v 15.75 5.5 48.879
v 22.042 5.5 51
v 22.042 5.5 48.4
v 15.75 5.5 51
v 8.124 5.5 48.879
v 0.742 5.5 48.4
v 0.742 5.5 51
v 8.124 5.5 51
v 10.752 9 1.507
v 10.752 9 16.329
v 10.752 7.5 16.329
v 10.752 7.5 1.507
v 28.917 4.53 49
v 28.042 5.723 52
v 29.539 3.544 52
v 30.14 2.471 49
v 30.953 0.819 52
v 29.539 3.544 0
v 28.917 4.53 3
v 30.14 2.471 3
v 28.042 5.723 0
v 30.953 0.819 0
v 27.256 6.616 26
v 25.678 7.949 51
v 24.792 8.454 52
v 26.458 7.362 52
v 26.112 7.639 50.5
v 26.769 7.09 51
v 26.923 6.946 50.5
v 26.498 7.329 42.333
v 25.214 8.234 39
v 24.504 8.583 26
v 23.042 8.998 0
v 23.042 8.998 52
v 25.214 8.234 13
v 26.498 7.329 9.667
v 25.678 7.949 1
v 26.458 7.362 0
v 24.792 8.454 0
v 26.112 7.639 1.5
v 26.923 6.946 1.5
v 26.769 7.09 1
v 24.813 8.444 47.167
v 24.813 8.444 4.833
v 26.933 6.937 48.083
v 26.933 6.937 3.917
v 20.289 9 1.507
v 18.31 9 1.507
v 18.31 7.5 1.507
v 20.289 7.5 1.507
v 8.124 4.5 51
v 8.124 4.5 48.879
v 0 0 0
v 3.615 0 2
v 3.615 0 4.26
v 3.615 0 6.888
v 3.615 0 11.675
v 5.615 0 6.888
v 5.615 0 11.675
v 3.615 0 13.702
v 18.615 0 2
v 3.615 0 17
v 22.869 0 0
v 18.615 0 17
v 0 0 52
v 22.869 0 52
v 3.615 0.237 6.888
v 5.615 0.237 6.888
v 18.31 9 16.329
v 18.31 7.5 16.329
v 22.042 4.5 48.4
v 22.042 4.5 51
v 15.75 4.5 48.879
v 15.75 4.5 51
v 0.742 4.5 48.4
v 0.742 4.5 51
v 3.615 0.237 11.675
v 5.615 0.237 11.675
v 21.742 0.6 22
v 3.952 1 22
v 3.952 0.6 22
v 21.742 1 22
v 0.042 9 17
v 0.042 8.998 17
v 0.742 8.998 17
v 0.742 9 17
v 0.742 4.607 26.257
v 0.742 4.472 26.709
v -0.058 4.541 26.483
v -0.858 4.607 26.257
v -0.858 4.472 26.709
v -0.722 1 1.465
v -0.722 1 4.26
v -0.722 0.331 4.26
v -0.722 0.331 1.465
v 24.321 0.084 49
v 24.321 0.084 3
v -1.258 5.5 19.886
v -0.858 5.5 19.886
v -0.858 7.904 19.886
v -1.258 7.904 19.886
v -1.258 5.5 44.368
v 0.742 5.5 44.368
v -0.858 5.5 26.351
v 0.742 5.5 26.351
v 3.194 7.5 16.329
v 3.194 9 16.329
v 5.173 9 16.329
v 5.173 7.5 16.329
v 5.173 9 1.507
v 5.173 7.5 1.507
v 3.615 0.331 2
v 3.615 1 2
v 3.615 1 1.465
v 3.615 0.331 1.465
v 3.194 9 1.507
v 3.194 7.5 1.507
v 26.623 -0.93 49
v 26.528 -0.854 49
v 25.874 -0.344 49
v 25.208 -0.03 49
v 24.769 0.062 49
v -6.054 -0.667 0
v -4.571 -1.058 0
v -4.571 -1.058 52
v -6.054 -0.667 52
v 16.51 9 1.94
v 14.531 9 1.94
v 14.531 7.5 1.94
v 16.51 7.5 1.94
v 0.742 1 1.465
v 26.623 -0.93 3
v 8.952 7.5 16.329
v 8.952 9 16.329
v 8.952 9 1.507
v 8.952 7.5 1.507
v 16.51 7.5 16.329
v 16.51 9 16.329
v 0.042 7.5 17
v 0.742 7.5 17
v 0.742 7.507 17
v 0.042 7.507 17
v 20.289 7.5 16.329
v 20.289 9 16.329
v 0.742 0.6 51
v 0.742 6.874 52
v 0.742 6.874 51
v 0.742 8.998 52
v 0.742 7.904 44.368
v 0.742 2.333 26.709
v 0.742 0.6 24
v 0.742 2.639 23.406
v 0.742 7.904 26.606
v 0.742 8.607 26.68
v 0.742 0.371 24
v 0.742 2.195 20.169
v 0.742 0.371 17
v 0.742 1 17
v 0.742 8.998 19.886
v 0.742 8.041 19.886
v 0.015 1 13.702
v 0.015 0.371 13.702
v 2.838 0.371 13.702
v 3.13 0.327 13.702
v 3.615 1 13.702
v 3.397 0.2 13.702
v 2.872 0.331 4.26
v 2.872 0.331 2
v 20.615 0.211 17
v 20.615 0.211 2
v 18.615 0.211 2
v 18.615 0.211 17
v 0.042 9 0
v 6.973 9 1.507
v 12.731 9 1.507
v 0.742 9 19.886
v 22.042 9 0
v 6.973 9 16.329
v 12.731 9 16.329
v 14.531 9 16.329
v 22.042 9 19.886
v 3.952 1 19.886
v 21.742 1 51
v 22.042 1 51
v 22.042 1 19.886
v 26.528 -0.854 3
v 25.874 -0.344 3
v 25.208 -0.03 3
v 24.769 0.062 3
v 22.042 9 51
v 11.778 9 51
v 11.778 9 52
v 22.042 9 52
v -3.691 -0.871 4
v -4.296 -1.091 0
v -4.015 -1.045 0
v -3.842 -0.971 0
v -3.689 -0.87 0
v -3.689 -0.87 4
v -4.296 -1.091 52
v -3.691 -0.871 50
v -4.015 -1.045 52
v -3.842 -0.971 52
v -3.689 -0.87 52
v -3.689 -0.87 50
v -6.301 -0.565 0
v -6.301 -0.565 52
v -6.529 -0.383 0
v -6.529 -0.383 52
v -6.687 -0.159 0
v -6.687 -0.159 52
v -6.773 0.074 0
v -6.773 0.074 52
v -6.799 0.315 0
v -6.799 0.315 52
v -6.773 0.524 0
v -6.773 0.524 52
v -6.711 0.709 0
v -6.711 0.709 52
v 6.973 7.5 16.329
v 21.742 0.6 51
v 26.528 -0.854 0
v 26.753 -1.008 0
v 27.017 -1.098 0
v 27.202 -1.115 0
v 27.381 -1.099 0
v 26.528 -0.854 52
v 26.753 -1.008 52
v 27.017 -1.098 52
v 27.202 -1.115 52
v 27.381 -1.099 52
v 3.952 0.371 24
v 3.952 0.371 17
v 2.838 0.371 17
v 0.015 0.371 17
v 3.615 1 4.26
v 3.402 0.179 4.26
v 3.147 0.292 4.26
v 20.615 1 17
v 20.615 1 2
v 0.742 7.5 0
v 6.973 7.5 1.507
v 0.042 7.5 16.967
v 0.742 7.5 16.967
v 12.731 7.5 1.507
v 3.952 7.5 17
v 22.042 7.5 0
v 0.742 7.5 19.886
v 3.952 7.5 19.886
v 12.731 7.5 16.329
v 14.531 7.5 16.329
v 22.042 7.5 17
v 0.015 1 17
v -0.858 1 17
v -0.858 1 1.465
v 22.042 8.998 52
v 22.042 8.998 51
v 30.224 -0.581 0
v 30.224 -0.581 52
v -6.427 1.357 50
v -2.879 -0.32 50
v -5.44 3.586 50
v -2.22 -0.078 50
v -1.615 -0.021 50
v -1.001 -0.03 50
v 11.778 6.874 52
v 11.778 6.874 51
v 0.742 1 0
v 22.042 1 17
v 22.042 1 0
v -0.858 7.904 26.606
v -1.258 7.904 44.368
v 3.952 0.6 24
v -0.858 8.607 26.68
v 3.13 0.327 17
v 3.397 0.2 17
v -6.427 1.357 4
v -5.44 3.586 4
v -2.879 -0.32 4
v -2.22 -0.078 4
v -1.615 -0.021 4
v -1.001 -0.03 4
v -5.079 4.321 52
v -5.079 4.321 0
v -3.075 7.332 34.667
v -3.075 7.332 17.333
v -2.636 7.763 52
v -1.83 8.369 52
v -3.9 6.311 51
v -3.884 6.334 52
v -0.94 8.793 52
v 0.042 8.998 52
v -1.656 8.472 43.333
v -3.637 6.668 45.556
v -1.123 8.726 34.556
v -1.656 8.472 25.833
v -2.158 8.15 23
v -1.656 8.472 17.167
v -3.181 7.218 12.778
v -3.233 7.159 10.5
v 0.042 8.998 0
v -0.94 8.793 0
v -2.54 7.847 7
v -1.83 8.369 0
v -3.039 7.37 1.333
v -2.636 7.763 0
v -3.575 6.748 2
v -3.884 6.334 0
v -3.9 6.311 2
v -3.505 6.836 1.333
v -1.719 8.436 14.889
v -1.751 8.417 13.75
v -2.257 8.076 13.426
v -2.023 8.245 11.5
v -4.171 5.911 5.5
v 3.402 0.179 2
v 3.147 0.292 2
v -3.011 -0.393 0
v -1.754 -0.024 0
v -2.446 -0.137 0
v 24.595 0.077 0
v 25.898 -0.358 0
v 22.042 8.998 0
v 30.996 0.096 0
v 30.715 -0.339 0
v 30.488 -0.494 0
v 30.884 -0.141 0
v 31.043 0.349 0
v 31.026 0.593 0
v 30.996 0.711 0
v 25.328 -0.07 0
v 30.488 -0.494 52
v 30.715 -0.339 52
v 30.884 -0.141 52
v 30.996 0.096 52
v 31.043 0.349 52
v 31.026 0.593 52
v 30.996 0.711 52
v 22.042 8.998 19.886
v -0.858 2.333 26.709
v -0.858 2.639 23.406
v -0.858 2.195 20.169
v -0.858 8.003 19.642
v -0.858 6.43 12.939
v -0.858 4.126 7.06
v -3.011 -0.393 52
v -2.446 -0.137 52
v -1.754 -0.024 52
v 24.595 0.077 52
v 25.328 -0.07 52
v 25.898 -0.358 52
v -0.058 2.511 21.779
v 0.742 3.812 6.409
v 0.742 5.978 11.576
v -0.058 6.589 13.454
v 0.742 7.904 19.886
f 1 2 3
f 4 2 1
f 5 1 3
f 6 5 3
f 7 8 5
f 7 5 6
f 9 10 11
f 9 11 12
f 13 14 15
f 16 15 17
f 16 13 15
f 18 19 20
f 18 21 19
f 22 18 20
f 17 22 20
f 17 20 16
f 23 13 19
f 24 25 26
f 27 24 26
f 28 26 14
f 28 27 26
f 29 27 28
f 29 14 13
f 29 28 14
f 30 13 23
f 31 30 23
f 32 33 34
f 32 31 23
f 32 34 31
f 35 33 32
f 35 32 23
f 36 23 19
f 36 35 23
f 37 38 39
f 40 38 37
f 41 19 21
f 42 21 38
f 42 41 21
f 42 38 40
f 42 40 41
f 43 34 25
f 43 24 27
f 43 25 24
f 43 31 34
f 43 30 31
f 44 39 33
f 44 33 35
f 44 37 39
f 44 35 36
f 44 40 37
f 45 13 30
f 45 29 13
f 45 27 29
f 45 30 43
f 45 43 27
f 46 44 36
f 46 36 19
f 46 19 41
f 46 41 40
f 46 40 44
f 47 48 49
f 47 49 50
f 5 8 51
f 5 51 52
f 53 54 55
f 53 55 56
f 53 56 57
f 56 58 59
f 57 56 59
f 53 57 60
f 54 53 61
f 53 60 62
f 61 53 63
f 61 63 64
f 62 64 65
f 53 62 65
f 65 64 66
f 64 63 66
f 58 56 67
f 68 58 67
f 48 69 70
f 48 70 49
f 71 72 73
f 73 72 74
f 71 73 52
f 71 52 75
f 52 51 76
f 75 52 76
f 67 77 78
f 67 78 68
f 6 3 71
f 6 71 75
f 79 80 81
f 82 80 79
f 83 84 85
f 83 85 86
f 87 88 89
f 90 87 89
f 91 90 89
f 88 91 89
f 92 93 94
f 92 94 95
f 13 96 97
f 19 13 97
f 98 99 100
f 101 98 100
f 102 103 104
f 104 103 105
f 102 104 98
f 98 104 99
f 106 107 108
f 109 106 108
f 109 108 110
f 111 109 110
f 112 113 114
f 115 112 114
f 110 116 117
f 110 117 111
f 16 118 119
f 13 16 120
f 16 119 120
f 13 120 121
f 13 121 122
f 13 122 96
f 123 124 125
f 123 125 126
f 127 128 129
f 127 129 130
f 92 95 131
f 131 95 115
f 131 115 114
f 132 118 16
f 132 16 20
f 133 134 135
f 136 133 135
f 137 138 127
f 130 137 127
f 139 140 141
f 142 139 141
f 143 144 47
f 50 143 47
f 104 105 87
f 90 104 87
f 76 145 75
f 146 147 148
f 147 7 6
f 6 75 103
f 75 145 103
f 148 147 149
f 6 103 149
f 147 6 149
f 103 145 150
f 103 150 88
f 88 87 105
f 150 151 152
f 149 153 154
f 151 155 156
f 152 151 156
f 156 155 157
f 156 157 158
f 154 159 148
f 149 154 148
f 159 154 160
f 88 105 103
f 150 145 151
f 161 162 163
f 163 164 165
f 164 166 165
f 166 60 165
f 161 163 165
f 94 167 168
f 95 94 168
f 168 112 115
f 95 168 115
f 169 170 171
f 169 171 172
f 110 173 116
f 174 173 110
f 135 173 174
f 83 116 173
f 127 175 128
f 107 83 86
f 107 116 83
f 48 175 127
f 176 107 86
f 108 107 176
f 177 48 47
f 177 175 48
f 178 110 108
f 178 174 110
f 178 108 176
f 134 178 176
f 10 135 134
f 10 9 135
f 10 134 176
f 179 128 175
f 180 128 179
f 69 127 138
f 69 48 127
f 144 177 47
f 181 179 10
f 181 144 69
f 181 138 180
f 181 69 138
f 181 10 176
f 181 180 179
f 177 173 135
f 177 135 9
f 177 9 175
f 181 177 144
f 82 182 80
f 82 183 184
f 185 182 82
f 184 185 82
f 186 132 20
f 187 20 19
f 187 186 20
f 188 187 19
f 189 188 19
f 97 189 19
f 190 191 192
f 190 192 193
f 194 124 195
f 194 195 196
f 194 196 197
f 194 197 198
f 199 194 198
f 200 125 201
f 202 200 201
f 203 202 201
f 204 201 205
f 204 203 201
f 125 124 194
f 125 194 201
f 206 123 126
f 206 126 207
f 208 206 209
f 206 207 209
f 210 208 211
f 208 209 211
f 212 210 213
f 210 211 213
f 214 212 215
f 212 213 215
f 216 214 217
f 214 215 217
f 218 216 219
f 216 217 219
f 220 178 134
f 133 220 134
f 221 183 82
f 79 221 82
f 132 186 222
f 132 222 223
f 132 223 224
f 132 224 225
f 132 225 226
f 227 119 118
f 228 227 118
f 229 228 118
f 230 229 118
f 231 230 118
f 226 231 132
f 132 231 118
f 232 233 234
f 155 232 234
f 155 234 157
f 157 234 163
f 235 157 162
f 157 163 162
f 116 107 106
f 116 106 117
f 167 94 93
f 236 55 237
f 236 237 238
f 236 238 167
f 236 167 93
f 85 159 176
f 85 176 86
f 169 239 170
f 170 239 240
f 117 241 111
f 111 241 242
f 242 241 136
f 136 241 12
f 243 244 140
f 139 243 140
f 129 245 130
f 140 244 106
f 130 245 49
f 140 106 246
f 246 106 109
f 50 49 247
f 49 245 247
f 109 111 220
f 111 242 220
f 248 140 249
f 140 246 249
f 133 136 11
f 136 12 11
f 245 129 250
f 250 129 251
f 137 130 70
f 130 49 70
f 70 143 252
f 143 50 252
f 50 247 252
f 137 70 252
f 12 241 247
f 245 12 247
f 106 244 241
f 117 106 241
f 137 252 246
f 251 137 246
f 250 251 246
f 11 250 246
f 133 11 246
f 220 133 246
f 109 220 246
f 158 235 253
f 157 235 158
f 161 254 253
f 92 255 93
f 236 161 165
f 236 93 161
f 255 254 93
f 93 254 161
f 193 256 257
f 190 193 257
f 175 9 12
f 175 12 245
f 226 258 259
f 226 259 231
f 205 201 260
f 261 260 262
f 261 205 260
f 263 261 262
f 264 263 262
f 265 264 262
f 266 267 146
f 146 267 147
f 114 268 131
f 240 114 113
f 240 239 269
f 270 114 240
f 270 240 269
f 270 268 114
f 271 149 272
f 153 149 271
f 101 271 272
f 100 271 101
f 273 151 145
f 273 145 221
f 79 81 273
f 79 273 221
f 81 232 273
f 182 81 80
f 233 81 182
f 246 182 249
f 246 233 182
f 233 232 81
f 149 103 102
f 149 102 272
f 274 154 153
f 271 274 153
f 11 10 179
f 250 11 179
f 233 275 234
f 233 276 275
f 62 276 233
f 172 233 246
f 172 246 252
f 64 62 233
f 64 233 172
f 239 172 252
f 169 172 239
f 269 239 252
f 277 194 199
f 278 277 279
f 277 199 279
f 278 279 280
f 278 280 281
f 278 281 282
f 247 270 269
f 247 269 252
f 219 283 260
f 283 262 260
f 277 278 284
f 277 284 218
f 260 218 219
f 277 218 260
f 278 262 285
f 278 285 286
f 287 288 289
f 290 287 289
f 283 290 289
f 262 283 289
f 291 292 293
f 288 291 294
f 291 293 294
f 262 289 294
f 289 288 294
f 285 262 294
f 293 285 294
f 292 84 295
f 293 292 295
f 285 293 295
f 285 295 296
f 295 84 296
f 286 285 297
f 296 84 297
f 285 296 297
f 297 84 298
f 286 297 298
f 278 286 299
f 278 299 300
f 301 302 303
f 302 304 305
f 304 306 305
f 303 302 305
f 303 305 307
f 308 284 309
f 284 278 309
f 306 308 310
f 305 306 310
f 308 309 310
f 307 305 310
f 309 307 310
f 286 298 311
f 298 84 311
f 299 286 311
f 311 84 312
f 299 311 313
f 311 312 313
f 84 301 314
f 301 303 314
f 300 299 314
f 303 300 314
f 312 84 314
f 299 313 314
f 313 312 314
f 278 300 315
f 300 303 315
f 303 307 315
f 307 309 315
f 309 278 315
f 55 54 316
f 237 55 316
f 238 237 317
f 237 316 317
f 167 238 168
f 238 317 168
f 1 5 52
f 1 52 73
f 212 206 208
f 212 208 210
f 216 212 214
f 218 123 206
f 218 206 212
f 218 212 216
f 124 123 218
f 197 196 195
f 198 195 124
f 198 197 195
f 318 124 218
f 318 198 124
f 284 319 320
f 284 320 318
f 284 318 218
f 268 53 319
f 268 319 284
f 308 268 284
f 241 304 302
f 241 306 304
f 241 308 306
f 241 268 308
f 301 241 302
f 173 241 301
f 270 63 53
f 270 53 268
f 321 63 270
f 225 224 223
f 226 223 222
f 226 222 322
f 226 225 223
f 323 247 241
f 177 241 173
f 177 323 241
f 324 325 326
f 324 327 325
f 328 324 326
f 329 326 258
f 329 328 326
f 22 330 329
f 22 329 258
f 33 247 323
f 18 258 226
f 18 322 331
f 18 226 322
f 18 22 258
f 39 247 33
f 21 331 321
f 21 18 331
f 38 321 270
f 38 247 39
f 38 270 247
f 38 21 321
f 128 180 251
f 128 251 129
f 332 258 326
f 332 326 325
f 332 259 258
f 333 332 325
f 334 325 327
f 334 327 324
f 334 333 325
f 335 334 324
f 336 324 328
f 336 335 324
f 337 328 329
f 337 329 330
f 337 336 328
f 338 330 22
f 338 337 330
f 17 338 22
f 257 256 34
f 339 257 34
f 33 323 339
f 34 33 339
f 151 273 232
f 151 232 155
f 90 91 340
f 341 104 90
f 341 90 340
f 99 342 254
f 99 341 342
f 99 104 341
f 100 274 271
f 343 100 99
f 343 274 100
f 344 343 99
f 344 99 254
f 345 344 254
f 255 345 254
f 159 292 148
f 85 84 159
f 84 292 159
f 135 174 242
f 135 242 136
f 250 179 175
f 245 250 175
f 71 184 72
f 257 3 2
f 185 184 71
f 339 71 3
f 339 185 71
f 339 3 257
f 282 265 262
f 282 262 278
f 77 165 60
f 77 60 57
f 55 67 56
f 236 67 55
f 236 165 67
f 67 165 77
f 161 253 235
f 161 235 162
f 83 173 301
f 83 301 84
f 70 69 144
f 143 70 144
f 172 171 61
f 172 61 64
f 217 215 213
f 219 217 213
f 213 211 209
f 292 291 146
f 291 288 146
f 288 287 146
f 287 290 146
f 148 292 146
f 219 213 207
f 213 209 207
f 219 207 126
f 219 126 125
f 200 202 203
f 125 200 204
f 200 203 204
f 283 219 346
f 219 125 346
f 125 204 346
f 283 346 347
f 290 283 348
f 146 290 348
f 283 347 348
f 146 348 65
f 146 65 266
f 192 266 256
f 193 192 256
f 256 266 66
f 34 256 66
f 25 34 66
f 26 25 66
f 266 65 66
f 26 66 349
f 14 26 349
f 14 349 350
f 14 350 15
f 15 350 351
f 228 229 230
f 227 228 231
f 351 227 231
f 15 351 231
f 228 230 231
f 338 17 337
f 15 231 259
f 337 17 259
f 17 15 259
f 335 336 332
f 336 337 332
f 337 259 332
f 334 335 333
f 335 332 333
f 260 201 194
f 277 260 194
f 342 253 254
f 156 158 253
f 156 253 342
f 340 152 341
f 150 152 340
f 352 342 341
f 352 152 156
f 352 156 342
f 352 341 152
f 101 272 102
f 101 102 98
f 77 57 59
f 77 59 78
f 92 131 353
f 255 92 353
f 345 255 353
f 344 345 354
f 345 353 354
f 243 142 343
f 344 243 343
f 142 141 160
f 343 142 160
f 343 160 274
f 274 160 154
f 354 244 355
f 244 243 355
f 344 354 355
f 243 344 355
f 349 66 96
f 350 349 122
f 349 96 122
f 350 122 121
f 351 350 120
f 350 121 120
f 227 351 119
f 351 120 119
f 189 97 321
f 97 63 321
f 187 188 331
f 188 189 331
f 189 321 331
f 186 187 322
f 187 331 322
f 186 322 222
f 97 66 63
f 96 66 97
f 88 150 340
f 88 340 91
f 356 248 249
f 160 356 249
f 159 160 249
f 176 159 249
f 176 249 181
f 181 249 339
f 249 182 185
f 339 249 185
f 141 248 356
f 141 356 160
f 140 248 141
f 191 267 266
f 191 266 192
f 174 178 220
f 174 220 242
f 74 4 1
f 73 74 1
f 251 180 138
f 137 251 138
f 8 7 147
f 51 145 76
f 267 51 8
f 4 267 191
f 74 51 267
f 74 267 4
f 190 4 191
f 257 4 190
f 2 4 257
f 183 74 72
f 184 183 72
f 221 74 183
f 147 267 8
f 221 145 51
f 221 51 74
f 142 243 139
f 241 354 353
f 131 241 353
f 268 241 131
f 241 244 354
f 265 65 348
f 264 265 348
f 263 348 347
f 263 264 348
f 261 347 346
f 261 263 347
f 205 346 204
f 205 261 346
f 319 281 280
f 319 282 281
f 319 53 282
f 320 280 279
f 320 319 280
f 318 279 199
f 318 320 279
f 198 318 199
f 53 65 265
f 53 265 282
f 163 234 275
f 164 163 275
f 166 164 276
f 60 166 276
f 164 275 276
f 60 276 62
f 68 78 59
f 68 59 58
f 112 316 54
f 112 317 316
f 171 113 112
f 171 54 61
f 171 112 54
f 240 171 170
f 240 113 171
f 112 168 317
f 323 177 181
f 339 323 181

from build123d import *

# Parameters (mm, degrees)
BOSS_EXTRUDE2_DEPTH      = 52
FILLET2_R                = 1
CUT_EXTRUDE2_DEPTH       = 3
CUT_EXTRUDE2_DEPTH_BACK  = 6
SKETCH10_W               = 2.350757351
SKETCH10_H               = 46
SKETCH11_W               = 17
SKETCH11_H               = 15
PELTIER_DEPTH            = 10
SKETCH12_W               = 21
SKETCH12_H               = 29
BATTERY_DEPTH            = 0.4
SKETCH14_W               = 21.3
SKETCH14_H               = 1
BOSS_EXTRUDE4_DEPTH      = 7.999920354
SKETCH15_W               = 3.297714658
SKETCH15_H               = 0.629450307
CUT_EXTRUDE5_DEPTH       = 3.6
SKETCH16_W               = 2.795507754
SKETCH16_H               = 0.669410668
CUT_EXTRUDE6_DEPTH       = 4.337027413
FILLET3_R                = 1
CUT_EXTRUDE7_DEPTH       = 1.6
CUT_EXTRUDE8_DEPTH       = 1.6
FILLET4_R                = 1
FILLET5_R                = 1
SKETCH19_W               = 21.3
SKETCH19_H               = 1
BOSS_EXTRUDE5_DEPTH      = 2.6
SKETCH20_W               = 7.625924169
SKETCH20_H               = 2.120993271
CUT_EXTRUDE9_DEPTH       = 2.6
SKETCH21_W               = 21.3
SKETCH21_H               = 2.886084762
BOSS_EXTRUDE6_DEPTH      = 8
SKETCH22_W               = 17
SKETCH22_H               = 1.5
BOSS_EXTRUDE7_DEPTH      = 22
SKETCH23_W               = 24.481547991
SKETCH23_H               = 2.403526745
CUT_EXTRUDE10_DEPTH      = 2
SKETCH24_W               = 15
SKETCH24_H               = 0.211445756
BOSS_EXTRUDE8_DEPTH      = 2
SKETCH25_W               = 4.787241237
SKETCH25_H               = 0.237383131
BOSS_EXTRUDE9_DEPTH      = 2
SKETCH26_W               = 11.036128308
SKETCH26_H               = 2.126226966
CUT_EXTRUDE11_DEPTH      = 2
CUT_EXTRUDE12_DEPTH      = 2
CUT_EXTRUDE12_DEPTH_BACK = 11
SKETCH27_W               = 46
SKETCH27_H               = 2.33
SKETCH28_W               = 1.978966
SKETCH28_H               = 14.822133623
SKETCH28_H_2             = 14.389327905
SKETCH28_W_2             = 1.978965999
CUT_EXTRUDE13_DEPTH      = 3
SKETCH29_W               = 3.210088646
SKETCH29_H               = 7.129450307
CUT_EXTRUDE14_DEPTH      = 7


with BuildPart() as part:
    # Sketch1 → Boss-Extrude2 (new body)
    with BuildSketch(Plane.XY):
        with BuildLine():
            Line((-4.066957942, -1.190846618), (-7.240355005, -0.354620493))
            add(Edge.make_bspline(
                [(0.042333709, 8.998333002), (-4.213116867, 8.648828695), (-5.962383558, 1.81462105), (-7.240355005, -0.354620493)],
                knots=[0, 0, 0, 0, 1, 1, 1, 1], degree=3))
            Line((0.042333709, 8.998333002), (0.742333709, 8.998333002))
            Line((0.742333709, 8.998333002), (0.742333709, 1))
            Line((0.742333709, 1), (22.042333709, 1))
            Line((22.042333709, 1), (22.042333709, 8.998333002))
            Line((22.042333709, 8.998333002), (23.042333709, 8.998333002))
            add(Edge.make_bspline(
                [(23.042333709, 8.998333002), (27.852391375, 8.27132168), (31.467788923, -0.354620493)],
                knots=[0, 0, 0, 1, 1, 1], degree=2))
            Line((31.467788923, -0.354620493), (26.875523276, -1.190846618))
            add(Edge.make_bspline(
                [(22.86911945, 0), (24.564241842, 0.074416087), (25.297281614, 0.429058332), (26.875523276, -1.190846618)],
                knots=[0, 0, 0, 0, 1, 1, 1, 1], degree=3))
            Line((22.86911945, 0), (0, 0))
            add(Edge.make_bspline(
                [(0, 0), (-1.870814346, -0.163675047), (-2.239916233, 0.430706612), (-4.066957942, -1.190846618)],
                knots=[0, 0, 0, 0, 1, 1, 1, 1], degree=3))
        make_face()
    extrude(amount=BOSS_EXTRUDE2_DEPTH)

    # Fillet2
    fillet2_edges = [part.edges().sort_by_distance(p)[0] for p in [
        (-4.066957942, -1.190846618, 26),
        (-7.240355005, -0.354620493, 26),
    ]]
    fillet(fillet2_edges, radius=FILLET2_R)

    # Sketch10 → Cut-Extrude2 (cut, two sides: drawn at the far end of the back side and taken through both)
    with BuildSketch(Plane(origin=(-4.380890916, 3.569201652, 0), x_dir=(0.631629007569502, 0.7752707893354205, 0), z_dir=(-0.7752707893354205, 0.631629007569502, 0)).offset(-CUT_EXTRUDE2_DEPTH_BACK)):
        with Locations((-1.831509184, -27)):
            Rectangle(SKETCH10_W, SKETCH10_H)
    extrude(amount=CUT_EXTRUDE2_DEPTH + CUT_EXTRUDE2_DEPTH_BACK, mode=Mode.SUBTRACT)

    # Sketch11 → Peltier (cut)
    with BuildSketch(Plane(origin=(0, 1, 0), x_dir=(1, 0, 0), z_dir=(0, 1, 0))):
        with Locations((12.114692368, -9.5)):
            Rectangle(SKETCH11_W, SKETCH11_H)
    extrude(amount=-PELTIER_DEPTH, mode=Mode.SUBTRACT)

    # Sketch12 → Battery (cut)
    with BuildSketch(Plane(origin=(0, 1, 0), x_dir=(1, 0, 0), z_dir=(0, 1, 0))):
        with Locations((11.242333709, -36.5)):
            Rectangle(SKETCH12_W, SKETCH12_H)
    extrude(amount=-BATTERY_DEPTH, mode=Mode.SUBTRACT)

    # Sketch14 → Boss-Extrude4 (add)
    with BuildSketch(Plane(origin=(0, 1, 0), x_dir=(1, 0, 0), z_dir=(0, 1, 0))):
        with Locations((11.392333709, -51.5)):
            Rectangle(SKETCH14_W, SKETCH14_H)
    extrude(amount=BOSS_EXTRUDE4_DEPTH)

    # Sketch15 → Cut-Extrude5 (cut)
    with BuildSketch(Plane(origin=(3.614692368, 0, 0), x_dir=(0, 0, -1), z_dir=(1, 0, 0))):
        with Locations((-15.351142671, 0.685274847)):
            Rectangle(SKETCH15_W, SKETCH15_H)
    extrude(amount=-CUT_EXTRUDE5_DEPTH, mode=Mode.SUBTRACT)

    # Sketch16 → Cut-Extrude6 (cut)
    with BuildSketch(Plane(origin=(3.614692368, 0, 0), x_dir=(0, 0, -1), z_dir=(1, 0, 0))):
        with Locations((-2.862635658, 0.665294666)):
            Rectangle(SKETCH16_W, SKETCH16_H)
    extrude(amount=-CUT_EXTRUDE6_DEPTH, mode=Mode.SUBTRACT)

    # Fillet3
    # the kernel refuses this fillet: 1 mm, written as the material it takes off along each edge
    with BuildSketch(Plane(origin=(3.614692368, 0.330589332, 2), x_dir=(0, -1, 0), z_dir=(0, 0, 1))) as fillet3_piece_1:
        with BuildLine():
            CenterArc((1, -0.742892561), FILLET3_R, 132.021596152, 47.978403848)
            Line((0, -0.742892561), (0, 0))
            Line((0, 0), (0.330589332, 0))
        make_face()
    extrude(amount=2.260389535, mode=Mode.SUBTRACT)
    with BuildSketch(Plane(origin=(3.614692368, 0.370549693, 17), x_dir=(0, -1, 0), z_dir=(0, 0, -1))) as fillet3_piece_2:
        with BuildLine():
            CenterArc((1, 0.77704074), FILLET3_R, 180, 50.990421184)
            Line((0, 0.77704074), (0, 0))
            Line((0, 0), (0.370549693, 0))
        make_face()
    extrude(amount=3.297714658, mode=Mode.SUBTRACT)

    # Sketch17 → Cut-Extrude7 (cut)
    with BuildSketch(Plane(origin=(0.742333709, 0, 0), x_dir=(0, 0, -1), z_dir=(1, 0, 0))):
        with BuildLine():
            Line((-26.679947222, 8.607264172), (-26.2562675, 4.600305927))
            add(Edge.make_bspline(
                [(-11.956359989, 1), (-18.174048642, 5.645894808), (-26.2562675, 4.600305927)],
                knots=[0, 0, 0, 1, 1, 1], degree=2))
            Line((-11.956359989, 1), (-1.464881781, 1))
            add(Edge.make_bspline(
                [(-1.464881781, 1), (-12.835212302, 8.374655541), (-26.679947222, 8.607264172)],
                knots=[0, 0, 0, 1, 1, 1], degree=2))
        make_face()
    extrude(amount=-CUT_EXTRUDE7_DEPTH, mode=Mode.SUBTRACT)

    # Sketch18 → Cut-Extrude8 (cut)
    with BuildSketch(Plane(origin=(0.742333709, 0, 0), x_dir=(0, 0, -1), z_dir=(1, 0, 0))):
        with BuildLine():
            Line((-26.709406335, 2.333242891), (-26.709406335, 4.472060633))
            add(Edge.make_bspline(
                [(-10.082290903, 1), (-18.147687182, 7.131693783), (-26.709406335, 4.472060633)],
                knots=[0, 0, 0, 1, 1, 1], degree=2))
            Line((-10.082290903, 1), (-17, 1))
            add(Edge.make_bspline(
                [(-17, 1), (-21.703390607, 3.354733642), (-26.709406335, 2.333242891)],
                knots=[0, 0, 0, 1, 1, 1], degree=2))
        make_face()
    extrude(amount=-CUT_EXTRUDE8_DEPTH, mode=Mode.SUBTRACT)

    # Fillet4
    fillet4_edges = [part.edges().sort_by_distance(p)[0] for p in [
        (26.875523276, -1.190846618, 26),
    ]]
    fillet(fillet4_edges, radius=FILLET4_R)

    # Fillet5
    fillet5_edges = [part.edges().sort_by_distance(p)[0] for p in [
        (31.467788923, -0.354620493, 26),
    ]]
    fillet(fillet5_edges, radius=FILLET5_R)

    # Sketch19 → Boss-Extrude5 (add)
    with BuildSketch(Plane(origin=(0, 0, 51), x_dir=(-1, 0, 0), z_dir=(0, 0, -1))):
        with Locations((-11.392333709, 5)):
            Rectangle(SKETCH19_W, SKETCH19_H)
    extrude(amount=BOSS_EXTRUDE5_DEPTH)

    # Sketch20 → Cut-Extrude9 (cut)
    with BuildSketch(Plane(origin=(0, 5.5, 0), x_dir=(1, 0, 0), z_dir=(0, 1, 0))):
        with Locations((11.936871332, -49.939503364)):
            Rectangle(SKETCH20_W, SKETCH20_H)
    extrude(amount=-CUT_EXTRUDE9_DEPTH, mode=Mode.SUBTRACT)

    # Sketch21 → Boss-Extrude6 (add)
    with BuildSketch(Plane(origin=(0, 1, 0), x_dir=(1, 0, 0), z_dir=(0, 1, 0))):
        with Locations((11.392333709, -18.443042381)):
            Rectangle(SKETCH21_W, SKETCH21_H)
    extrude(amount=BOSS_EXTRUDE6_DEPTH)

    # Sketch22 → Boss-Extrude7 (add)
    with BuildSketch(Plane.ZY.offset(-22.042333709)):
        with Locations((8.5, 8.25)):
            Rectangle(SKETCH22_W, SKETCH22_H)
    extrude(amount=BOSS_EXTRUDE7_DEPTH)

    # Sketch23 → Cut-Extrude10 (cut)
    with BuildSketch(Plane(origin=(0.742333709, 0, 0), x_dir=(0, 0, -1), z_dir=(1, 0, 0))):
        with Locations((-32.126858758, 6.701763373)):
            Rectangle(SKETCH23_W, SKETCH23_H)
    extrude(amount=-CUT_EXTRUDE10_DEPTH, mode=Mode.SUBTRACT)

    # Sketch24 → Boss-Extrude8 (add)
    with BuildSketch(Plane.ZY.offset(-20.614692368)):
        with Locations((9.5, 0.105722878)):
            Rectangle(SKETCH24_W, SKETCH24_H)
    extrude(amount=BOSS_EXTRUDE8_DEPTH)

    # Sketch25 → Boss-Extrude9 (add)
    with BuildSketch(Plane(origin=(3.614692368, 0, 0), x_dir=(0, 0, -1), z_dir=(1, 0, 0))):
        with Locations((-9.281203123, 0.118691566)):
            Rectangle(SKETCH25_W, SKETCH25_H)
    extrude(amount=BOSS_EXTRUDE9_DEPTH)

    # Sketch26 → Cut-Extrude11 (cut)
    with BuildSketch(Plane(origin=(0, 0, 51), x_dir=(-1, 0, 0), z_dir=(0, 0, -1))):
        with Locations((-6.260397863, 7.936806871)):
            Rectangle(SKETCH26_W, SKETCH26_H)
    extrude(amount=-CUT_EXTRUDE11_DEPTH, mode=Mode.SUBTRACT)

    # Sketch27 → Cut-Extrude12 (cut, two sides: drawn at the far end of the back side and taken through both)
    with BuildSketch(Plane(origin=(16.401330443, 15.864191281, 0), x_dir=(0, 0, -1), z_dir=(0.7187787233935905, 0.6952389134654938, 0)).offset(-CUT_EXTRUDE12_DEPTH_BACK)):
        with Locations((-26, -18.013212029)):
            Rectangle(SKETCH27_W, SKETCH27_H)
    extrude(amount=CUT_EXTRUDE12_DEPTH + CUT_EXTRUDE12_DEPTH_BACK, mode=Mode.SUBTRACT)

    # Sketch28 → Cut-Extrude13 (cut)
    with BuildSketch(Plane(origin=(0, 9, 0), x_dir=(1, 0, 0), z_dir=(0, 1, 0))):
        with Locations((19.299375066, -8.918059871)):
            Rectangle(SKETCH28_W, SKETCH28_H)
        with Locations((15.520409066, -9.13446273)):
            Rectangle(SKETCH28_W, SKETCH28_H_2)
        with Locations((11.741443067, -8.918059871)):
            Rectangle(SKETCH28_W_2, SKETCH28_H)
        with Locations((7.962477067, -8.918059871)):
            Rectangle(SKETCH28_W, SKETCH28_H)
        with Locations((4.183511067, -8.918059871)):
            Rectangle(SKETCH28_W, SKETCH28_H)
    extrude(amount=-CUT_EXTRUDE13_DEPTH, mode=Mode.SUBTRACT)

    # Sketch29 → Cut-Extrude14 (cut)
    with BuildSketch(Plane(origin=(0, 0, 17), x_dir=(-1, 0, 0), z_dir=(0, 0, -1))):
        with Locations((-2.347378032, 3.935274847)):
            Rectangle(SKETCH29_W, SKETCH29_H)
    extrude(amount=-CUT_EXTRUDE14_DEPTH, mode=Mode.SUBTRACT)


solid = part.part
